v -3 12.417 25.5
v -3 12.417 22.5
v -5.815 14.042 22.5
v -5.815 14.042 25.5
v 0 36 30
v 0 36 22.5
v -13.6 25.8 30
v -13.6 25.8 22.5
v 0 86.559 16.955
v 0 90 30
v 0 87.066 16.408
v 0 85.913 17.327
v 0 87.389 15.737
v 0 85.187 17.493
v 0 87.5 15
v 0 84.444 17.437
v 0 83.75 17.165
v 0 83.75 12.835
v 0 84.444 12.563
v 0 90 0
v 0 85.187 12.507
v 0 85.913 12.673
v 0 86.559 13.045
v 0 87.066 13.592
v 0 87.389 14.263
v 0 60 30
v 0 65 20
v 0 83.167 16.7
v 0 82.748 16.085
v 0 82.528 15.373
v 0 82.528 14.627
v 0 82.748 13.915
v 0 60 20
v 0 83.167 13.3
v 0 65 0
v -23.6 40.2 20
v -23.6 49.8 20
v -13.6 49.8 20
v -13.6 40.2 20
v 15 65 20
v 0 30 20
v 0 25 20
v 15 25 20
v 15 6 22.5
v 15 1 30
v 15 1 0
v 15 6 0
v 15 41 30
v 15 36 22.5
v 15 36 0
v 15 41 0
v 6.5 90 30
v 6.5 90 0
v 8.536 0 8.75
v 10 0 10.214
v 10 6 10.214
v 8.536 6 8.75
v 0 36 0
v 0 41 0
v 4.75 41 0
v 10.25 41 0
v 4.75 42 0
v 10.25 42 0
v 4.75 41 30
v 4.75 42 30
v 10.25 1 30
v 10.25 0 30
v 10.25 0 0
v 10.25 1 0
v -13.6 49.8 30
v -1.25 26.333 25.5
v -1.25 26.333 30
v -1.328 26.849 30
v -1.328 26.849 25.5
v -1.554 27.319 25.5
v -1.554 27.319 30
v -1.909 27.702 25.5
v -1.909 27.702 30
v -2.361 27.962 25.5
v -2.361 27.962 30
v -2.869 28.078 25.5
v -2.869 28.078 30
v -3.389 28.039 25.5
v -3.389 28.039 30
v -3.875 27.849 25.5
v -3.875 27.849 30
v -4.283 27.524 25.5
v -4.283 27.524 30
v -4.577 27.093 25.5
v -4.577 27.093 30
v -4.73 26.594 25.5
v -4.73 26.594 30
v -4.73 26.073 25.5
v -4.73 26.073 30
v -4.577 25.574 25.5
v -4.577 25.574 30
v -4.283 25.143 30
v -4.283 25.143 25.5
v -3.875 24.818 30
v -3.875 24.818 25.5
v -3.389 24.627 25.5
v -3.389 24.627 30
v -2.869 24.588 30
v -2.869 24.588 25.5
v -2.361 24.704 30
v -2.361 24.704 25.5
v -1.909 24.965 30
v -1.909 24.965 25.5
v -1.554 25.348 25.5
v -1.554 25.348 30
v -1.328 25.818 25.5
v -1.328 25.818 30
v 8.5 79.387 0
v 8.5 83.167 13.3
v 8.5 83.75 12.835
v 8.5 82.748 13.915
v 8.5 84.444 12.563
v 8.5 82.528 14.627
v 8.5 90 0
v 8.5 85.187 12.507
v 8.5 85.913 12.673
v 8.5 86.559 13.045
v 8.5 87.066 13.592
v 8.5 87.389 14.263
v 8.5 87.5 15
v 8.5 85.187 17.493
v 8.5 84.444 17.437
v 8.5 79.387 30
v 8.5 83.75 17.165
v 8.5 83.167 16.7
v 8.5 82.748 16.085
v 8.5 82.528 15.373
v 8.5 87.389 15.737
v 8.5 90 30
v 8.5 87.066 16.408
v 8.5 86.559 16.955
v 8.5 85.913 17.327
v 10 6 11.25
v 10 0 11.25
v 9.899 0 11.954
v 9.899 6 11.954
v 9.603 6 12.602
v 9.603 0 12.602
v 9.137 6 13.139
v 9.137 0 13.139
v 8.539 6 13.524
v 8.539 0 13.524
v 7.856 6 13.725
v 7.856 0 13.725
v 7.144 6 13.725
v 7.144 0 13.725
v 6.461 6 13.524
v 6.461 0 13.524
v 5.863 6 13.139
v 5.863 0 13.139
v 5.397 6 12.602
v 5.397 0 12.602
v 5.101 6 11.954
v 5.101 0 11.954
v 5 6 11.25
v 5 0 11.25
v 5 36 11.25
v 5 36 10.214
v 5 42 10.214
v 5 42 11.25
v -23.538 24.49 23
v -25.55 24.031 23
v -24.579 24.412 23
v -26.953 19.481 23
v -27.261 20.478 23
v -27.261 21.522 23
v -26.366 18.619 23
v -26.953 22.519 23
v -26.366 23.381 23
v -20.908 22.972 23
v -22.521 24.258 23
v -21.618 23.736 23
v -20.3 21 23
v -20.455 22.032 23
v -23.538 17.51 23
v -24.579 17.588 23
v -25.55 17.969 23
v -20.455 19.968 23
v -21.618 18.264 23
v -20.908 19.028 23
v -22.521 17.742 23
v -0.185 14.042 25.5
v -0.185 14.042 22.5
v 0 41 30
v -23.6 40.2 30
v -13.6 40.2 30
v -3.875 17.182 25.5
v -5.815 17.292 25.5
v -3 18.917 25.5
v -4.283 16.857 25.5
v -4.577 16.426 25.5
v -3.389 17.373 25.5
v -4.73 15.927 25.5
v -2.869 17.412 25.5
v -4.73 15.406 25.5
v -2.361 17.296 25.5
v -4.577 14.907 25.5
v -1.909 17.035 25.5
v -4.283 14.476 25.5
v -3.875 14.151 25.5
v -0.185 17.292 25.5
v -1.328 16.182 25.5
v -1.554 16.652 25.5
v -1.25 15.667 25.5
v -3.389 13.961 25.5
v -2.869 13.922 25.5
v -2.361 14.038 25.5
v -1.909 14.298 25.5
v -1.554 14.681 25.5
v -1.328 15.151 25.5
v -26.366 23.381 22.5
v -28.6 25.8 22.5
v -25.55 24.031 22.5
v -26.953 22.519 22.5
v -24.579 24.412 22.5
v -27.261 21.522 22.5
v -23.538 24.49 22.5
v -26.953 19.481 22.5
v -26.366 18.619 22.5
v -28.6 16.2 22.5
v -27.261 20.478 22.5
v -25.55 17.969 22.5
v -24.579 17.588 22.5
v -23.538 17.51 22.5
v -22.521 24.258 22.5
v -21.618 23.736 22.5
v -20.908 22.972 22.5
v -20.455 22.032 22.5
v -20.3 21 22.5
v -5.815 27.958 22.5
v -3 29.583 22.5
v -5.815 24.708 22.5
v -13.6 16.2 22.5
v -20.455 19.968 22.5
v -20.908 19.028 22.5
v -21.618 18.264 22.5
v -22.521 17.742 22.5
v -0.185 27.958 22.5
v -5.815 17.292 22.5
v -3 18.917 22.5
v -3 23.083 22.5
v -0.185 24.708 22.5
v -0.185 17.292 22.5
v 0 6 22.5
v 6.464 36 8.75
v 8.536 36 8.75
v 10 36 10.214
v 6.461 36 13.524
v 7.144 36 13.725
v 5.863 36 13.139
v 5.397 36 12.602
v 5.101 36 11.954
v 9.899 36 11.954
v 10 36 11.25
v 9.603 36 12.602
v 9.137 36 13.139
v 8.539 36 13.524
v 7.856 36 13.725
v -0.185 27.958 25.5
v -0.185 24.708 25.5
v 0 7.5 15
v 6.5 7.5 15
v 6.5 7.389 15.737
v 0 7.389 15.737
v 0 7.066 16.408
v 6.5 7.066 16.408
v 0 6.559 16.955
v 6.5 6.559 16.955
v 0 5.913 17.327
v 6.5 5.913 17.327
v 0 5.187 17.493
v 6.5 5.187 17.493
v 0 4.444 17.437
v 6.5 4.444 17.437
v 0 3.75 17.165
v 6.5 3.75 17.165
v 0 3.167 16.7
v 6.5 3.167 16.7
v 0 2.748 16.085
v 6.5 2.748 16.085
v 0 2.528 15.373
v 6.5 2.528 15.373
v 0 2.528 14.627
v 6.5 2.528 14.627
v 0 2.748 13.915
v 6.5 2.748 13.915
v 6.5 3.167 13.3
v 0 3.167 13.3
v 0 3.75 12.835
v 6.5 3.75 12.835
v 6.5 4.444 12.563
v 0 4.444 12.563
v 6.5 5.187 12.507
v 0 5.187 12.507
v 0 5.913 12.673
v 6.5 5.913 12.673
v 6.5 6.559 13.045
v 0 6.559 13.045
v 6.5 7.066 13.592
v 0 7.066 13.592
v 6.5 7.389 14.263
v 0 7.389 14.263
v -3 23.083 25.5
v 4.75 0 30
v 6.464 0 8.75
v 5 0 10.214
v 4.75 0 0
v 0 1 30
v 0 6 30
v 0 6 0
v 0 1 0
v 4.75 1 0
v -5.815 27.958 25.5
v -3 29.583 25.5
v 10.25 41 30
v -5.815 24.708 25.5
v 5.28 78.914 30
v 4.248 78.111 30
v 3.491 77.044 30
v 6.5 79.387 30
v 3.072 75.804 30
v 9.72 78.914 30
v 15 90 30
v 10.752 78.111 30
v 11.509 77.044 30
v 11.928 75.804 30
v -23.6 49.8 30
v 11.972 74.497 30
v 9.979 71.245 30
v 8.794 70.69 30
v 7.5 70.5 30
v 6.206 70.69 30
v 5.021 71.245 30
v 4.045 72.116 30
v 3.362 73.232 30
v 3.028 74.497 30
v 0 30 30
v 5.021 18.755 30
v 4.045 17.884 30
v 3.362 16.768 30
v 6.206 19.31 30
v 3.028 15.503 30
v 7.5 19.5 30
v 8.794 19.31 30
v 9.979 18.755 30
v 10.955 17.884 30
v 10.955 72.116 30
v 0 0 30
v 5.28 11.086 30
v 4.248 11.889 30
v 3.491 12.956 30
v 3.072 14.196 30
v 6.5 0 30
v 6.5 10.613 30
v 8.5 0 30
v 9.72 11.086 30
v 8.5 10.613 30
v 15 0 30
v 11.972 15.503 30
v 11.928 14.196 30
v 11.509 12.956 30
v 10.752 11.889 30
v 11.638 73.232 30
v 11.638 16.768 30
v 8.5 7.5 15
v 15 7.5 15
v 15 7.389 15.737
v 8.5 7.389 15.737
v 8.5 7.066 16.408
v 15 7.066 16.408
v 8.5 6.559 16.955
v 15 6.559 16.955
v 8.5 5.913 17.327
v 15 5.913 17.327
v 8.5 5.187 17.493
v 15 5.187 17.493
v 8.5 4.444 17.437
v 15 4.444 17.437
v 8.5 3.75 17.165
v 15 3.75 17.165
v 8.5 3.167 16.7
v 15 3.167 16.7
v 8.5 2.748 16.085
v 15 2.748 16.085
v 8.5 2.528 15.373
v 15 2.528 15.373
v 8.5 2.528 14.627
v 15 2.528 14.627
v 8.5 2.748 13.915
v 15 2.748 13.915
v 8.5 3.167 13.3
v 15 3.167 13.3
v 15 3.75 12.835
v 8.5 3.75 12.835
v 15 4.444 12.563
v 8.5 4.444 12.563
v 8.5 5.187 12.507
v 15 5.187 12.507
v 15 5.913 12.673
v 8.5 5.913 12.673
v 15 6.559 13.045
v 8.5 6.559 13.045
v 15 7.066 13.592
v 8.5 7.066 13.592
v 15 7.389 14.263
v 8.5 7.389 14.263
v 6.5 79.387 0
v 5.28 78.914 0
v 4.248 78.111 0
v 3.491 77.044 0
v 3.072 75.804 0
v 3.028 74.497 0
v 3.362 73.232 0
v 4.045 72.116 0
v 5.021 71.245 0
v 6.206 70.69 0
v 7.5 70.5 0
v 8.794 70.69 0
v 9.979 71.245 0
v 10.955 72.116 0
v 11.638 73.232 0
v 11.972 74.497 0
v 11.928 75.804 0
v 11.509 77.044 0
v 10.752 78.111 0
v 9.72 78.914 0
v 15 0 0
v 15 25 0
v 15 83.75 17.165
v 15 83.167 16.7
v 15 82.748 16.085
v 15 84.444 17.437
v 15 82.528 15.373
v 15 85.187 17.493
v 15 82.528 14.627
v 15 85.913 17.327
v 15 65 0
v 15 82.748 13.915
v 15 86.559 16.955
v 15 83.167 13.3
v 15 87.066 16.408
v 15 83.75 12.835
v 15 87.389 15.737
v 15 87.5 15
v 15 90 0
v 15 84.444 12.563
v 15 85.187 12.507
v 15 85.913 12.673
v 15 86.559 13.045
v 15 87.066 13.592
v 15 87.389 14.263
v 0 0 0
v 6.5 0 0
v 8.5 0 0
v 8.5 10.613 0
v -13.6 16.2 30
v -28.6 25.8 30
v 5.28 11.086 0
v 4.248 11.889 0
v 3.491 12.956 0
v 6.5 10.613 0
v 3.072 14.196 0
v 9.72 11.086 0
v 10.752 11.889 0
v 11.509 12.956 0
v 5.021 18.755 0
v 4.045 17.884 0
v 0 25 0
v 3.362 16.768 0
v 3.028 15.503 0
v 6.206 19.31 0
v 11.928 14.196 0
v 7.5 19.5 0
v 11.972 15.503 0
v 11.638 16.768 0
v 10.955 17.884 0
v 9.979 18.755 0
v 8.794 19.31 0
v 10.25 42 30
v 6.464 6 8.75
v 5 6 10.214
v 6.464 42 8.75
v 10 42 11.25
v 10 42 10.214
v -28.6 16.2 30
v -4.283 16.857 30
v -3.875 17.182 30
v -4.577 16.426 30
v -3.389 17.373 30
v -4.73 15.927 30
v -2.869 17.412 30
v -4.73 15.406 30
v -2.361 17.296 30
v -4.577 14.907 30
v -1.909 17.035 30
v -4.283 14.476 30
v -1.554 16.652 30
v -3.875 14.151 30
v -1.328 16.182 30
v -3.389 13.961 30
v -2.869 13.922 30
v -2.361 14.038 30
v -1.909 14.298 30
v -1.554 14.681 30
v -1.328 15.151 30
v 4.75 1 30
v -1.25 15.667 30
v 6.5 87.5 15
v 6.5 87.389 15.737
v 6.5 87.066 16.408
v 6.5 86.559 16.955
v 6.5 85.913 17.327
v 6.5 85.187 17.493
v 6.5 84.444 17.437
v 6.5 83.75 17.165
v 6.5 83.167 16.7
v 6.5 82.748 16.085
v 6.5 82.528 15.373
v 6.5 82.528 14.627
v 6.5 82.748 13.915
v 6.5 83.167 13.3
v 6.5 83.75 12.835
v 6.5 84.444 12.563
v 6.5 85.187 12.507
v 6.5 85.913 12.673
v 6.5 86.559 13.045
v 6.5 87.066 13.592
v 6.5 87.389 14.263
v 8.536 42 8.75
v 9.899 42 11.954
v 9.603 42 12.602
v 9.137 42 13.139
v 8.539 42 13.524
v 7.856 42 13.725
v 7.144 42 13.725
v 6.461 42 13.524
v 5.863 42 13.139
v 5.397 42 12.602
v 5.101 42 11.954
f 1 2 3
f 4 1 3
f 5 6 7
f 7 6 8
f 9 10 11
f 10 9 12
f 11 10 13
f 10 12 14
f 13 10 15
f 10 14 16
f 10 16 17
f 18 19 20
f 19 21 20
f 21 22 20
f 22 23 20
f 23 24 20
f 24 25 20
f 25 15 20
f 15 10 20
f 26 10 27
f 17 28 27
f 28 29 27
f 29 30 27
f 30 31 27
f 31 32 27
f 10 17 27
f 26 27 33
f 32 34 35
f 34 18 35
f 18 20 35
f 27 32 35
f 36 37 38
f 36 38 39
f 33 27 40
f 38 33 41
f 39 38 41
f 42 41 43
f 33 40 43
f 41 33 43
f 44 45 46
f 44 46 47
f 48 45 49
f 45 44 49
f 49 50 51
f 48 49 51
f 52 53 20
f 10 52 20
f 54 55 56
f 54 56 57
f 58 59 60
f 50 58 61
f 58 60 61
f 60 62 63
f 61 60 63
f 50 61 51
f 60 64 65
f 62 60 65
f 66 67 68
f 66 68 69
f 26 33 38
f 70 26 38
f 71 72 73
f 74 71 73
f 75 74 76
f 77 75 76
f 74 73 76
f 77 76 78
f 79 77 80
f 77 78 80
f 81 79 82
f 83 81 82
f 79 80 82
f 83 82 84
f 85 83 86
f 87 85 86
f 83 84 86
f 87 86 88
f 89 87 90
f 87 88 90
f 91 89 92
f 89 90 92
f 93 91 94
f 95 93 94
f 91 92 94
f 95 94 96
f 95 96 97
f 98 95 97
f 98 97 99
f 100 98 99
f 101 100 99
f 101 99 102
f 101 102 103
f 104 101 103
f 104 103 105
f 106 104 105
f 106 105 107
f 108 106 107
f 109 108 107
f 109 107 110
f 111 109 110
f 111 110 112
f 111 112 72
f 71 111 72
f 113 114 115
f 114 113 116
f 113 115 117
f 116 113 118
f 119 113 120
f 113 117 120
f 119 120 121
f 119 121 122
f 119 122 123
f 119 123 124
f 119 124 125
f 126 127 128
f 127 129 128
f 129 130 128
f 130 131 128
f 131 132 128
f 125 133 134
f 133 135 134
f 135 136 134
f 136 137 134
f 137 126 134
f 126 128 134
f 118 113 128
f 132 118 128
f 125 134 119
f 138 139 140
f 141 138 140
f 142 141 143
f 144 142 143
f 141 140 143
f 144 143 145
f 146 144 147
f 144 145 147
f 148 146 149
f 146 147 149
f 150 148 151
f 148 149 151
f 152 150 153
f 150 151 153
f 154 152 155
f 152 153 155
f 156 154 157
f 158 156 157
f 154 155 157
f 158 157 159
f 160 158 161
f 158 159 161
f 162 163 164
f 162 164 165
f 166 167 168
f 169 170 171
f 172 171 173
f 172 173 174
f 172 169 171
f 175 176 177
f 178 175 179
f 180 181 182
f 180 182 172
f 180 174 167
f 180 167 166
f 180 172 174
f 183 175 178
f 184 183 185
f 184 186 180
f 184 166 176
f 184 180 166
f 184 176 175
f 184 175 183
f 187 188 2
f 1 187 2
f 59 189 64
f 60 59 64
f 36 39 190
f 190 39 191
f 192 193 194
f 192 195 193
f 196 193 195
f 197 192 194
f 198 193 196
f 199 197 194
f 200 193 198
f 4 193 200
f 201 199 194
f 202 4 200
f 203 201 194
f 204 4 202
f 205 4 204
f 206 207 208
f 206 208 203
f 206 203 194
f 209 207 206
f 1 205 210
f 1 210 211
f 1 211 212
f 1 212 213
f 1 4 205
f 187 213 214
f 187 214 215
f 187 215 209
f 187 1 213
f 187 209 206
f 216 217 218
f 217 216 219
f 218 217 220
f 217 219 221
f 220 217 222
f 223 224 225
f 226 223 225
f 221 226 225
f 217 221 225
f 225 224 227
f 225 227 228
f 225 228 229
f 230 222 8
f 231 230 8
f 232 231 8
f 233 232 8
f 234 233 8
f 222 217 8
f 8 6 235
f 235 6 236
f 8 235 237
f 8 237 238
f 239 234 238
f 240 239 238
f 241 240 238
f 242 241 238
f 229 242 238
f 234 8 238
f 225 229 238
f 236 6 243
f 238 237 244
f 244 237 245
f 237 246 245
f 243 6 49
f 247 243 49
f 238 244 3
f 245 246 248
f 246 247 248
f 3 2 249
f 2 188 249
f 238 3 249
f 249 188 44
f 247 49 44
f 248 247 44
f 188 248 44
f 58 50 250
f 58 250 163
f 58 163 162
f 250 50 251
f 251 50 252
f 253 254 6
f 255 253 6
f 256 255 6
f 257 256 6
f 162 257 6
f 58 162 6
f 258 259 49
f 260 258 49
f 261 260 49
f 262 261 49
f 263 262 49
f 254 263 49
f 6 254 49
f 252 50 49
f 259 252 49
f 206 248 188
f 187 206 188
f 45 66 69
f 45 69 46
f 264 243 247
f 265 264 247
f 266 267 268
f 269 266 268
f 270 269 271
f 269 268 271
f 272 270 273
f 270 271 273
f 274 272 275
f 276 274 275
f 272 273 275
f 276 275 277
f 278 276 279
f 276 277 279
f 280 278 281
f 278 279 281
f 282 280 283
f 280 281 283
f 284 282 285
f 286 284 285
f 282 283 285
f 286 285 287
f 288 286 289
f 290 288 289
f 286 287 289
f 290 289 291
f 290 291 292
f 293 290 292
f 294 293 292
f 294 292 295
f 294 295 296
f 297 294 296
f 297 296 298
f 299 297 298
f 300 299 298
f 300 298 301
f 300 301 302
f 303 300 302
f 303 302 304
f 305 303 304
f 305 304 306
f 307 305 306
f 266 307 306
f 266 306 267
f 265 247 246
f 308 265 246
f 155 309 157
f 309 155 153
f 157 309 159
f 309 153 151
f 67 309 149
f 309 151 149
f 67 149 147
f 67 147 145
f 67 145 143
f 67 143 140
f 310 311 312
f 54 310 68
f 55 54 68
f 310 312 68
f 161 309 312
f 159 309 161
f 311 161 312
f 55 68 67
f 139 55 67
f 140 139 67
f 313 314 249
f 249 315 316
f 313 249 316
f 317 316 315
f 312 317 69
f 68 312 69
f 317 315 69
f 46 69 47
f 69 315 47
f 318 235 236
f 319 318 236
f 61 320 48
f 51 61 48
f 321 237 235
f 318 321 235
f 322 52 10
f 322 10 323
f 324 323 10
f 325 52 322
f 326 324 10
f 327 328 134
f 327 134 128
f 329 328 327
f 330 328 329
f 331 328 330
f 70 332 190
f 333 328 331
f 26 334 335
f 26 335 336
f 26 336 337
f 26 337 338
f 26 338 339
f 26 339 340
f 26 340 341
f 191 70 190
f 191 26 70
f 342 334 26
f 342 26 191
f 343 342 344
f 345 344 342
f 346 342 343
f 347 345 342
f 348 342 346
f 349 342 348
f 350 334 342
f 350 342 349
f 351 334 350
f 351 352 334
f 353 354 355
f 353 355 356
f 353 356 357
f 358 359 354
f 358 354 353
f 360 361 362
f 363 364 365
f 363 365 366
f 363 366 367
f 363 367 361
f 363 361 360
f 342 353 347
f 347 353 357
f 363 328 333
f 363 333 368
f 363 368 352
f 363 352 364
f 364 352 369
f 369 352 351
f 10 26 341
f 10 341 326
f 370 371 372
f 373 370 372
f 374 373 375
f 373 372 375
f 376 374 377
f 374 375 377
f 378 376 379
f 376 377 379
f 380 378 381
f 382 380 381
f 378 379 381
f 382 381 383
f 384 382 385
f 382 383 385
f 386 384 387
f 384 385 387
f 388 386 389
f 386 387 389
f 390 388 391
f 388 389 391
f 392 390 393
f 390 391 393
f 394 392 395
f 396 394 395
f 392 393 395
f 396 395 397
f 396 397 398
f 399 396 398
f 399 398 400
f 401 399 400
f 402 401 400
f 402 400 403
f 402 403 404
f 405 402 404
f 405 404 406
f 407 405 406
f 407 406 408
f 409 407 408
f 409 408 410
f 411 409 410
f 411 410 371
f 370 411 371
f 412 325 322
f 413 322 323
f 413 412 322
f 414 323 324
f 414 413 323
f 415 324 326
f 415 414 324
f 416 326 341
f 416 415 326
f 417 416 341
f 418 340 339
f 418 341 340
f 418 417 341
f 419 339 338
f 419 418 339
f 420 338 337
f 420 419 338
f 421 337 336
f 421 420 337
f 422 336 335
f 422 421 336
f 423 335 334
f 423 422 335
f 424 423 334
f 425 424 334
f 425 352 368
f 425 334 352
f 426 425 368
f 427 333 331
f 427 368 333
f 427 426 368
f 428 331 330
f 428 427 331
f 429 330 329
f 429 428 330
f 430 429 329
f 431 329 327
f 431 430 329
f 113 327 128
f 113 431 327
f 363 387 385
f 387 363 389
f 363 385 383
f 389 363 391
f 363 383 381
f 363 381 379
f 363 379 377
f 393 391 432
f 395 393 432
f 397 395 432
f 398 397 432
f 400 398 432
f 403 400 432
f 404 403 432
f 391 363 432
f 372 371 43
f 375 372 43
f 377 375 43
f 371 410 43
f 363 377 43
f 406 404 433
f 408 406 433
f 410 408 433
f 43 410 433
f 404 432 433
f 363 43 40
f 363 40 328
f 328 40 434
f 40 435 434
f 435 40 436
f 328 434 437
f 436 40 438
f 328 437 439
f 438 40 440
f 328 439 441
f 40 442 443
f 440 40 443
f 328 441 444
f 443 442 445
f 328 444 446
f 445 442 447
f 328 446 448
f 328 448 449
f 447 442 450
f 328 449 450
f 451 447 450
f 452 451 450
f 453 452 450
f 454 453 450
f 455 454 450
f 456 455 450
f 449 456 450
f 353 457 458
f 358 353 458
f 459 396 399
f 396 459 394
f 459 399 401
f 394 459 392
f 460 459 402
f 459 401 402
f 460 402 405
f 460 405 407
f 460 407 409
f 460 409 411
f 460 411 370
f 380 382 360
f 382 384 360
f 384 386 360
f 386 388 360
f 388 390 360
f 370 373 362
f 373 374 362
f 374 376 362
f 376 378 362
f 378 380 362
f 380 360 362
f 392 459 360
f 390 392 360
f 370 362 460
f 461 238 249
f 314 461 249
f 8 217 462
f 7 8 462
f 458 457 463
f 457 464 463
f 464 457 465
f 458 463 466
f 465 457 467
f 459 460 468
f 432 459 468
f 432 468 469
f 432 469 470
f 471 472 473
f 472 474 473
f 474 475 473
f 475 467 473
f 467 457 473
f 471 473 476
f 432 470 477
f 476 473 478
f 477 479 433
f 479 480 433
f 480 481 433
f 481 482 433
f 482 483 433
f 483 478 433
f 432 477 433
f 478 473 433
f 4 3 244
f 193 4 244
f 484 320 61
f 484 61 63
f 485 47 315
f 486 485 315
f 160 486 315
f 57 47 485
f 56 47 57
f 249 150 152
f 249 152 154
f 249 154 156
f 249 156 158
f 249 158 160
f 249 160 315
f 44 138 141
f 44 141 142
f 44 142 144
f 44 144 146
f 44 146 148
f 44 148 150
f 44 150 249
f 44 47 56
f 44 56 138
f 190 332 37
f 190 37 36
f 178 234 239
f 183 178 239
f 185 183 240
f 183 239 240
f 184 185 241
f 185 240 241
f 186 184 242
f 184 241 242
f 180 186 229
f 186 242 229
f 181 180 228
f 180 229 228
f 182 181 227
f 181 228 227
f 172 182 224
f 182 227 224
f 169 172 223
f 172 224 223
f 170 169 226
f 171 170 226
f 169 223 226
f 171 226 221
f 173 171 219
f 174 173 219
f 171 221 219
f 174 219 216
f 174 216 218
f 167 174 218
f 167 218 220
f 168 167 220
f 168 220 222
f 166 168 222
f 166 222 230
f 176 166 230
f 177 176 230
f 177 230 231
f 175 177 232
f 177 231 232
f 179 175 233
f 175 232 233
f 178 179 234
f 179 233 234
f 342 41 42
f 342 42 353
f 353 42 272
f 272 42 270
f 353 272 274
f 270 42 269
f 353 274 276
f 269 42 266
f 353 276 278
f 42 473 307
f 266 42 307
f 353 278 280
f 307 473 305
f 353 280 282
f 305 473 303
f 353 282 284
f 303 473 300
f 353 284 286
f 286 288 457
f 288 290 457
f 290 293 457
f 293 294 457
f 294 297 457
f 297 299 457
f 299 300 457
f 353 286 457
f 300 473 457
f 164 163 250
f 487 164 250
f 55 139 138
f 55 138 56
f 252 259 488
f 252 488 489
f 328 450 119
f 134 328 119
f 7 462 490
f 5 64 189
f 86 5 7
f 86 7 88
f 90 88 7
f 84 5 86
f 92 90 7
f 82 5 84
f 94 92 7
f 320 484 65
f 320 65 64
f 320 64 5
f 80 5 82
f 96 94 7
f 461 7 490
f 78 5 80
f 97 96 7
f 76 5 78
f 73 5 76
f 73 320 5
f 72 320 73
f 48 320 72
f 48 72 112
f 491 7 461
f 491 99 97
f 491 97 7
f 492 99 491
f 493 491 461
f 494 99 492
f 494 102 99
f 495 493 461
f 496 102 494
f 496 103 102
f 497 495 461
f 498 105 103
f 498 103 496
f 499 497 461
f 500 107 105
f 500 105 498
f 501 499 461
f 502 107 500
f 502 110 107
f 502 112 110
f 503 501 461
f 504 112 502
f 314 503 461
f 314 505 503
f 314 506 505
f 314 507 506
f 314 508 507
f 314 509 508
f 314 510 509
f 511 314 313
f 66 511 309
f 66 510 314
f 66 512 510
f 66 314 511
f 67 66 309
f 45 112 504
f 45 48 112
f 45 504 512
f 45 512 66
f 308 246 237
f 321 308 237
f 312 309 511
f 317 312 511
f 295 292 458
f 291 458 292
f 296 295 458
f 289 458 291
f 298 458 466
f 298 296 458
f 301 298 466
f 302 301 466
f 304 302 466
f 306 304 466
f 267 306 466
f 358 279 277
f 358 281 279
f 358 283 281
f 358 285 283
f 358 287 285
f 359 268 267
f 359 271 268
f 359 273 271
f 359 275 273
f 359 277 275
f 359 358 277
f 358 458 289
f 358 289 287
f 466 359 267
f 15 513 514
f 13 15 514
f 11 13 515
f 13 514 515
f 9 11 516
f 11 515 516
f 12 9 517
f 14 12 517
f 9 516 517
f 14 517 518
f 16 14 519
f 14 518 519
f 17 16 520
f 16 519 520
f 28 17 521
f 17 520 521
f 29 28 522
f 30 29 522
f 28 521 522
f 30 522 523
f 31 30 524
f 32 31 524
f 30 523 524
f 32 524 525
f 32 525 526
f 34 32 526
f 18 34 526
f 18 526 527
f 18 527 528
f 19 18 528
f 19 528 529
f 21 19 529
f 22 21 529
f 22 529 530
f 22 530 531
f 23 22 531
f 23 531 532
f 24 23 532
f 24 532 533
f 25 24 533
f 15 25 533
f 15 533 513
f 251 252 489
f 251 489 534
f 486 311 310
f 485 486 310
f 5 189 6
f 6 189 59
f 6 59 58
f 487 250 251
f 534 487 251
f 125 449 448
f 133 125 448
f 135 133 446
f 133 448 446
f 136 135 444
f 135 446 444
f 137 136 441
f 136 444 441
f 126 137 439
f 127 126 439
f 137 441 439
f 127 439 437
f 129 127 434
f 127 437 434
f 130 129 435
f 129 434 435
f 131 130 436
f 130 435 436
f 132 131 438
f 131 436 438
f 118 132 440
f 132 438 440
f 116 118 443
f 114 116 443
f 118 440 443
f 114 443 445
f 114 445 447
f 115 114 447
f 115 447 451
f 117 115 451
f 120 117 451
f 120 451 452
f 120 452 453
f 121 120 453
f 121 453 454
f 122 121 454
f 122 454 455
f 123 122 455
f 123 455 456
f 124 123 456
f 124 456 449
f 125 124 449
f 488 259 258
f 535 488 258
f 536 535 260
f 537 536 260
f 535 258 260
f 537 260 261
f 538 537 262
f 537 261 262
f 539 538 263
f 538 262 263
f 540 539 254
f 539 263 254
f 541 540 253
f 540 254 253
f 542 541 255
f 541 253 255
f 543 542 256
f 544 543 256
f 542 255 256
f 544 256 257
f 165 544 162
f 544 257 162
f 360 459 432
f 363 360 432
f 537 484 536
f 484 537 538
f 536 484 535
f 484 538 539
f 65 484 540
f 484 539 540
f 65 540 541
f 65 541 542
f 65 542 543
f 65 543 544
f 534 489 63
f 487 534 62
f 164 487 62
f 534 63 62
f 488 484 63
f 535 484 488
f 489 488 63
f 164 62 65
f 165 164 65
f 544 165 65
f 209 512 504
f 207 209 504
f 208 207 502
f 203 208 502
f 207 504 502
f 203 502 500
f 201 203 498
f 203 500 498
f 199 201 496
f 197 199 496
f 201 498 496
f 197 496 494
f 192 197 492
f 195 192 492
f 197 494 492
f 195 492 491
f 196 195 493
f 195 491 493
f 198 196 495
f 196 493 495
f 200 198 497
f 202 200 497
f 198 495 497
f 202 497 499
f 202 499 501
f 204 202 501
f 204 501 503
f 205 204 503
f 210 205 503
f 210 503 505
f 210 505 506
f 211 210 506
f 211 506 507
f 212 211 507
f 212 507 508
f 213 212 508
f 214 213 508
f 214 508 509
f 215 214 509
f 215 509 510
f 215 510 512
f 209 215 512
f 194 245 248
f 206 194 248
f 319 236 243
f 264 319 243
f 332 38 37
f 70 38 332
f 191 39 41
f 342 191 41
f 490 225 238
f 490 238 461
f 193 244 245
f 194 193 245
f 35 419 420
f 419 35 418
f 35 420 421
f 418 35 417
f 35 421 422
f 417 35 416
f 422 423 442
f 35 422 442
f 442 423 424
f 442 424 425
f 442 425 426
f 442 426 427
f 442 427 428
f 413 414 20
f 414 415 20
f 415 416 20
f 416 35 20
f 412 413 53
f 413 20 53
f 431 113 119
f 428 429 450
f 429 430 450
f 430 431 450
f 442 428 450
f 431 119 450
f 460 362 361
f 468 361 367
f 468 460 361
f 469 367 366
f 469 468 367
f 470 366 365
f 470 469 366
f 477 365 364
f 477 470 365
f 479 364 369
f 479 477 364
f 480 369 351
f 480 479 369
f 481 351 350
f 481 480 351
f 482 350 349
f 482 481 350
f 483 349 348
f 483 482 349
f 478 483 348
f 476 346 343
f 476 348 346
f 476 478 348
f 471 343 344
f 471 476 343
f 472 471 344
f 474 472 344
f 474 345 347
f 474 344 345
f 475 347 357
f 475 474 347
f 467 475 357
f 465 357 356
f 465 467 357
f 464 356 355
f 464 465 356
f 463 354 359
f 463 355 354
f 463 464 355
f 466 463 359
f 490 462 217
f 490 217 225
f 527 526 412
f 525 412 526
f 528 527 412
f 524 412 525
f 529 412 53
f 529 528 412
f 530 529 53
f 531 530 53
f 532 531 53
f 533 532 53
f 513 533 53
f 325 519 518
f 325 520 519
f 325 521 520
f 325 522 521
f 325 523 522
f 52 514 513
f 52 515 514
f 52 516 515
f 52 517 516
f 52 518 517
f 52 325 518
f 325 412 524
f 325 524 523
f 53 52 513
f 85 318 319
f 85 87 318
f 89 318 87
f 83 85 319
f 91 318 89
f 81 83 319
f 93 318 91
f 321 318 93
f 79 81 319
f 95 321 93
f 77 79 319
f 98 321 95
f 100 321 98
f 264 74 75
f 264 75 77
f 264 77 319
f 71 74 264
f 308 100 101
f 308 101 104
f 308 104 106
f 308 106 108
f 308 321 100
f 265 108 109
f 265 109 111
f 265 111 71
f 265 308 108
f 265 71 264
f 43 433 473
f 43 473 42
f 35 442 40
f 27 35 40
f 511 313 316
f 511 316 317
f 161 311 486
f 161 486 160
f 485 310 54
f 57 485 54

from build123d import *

# Parameters (mm, degrees)
SKETCH_R        = 4.5
PAD_DEPTH       = 30
SKETCH001_W     = 2
SKETCH001_H     = 15
POCKET_DEPTH    = 30
SKETCH002_R     = 2.5
SKETCH002_W     = 40
SKETCH002_H     = 20
POCKET001_DEPTH = 35
CHAMFER_SIZE    = 8
SKETCH003_W     = 9.6
SKETCH003_H     = 10
PAD001_DEPTH    = 10
PAD002_DEPTH    = 30
SKETCH005_W     = 4.75
SKETCH005_H     = 1
POCKET002_DEPTH = 30.001
SKETCH006_W     = 30
SKETCH006_H     = 22.5
POCKET003_DEPTH = 35.001
POCKET004_DEPTH = 42.001
POCKET005_DEPTH = 3
SKETCH009_R     = 1.75
POCKET006_DEPTH = 30.001
CHAMFER001_SIZE = 8
SKETCH010_W     = 9.6
SKETCH010_H     = 7.5
PAD003_DEPTH    = 15
SKETCH011_R     = 3.5
POCKET007_DEPTH = 0.5


with BuildPart() as buildplatformmountingp1_alt:
    # Sketch → Pad (new body)
    with BuildSketch(Plane.XY):
        Polygon((0, 0), (15, 0), (15, 90), (0, 90), (0, 60), (-20, 45), (0, 30), align=None)
        with Locations((7.5, 15)):
            Circle(SKETCH_R, mode=Mode.SUBTRACT)
        with Locations((7.5, 75)):
            Circle(SKETCH_R, mode=Mode.SUBTRACT)
    extrude(amount=PAD_DEPTH)

    # Sketch001 → Pocket (cut)
    with BuildSketch(Plane.XY.offset(30)):
        with Locations((7.5, 82.5)):
            Rectangle(SKETCH001_W, SKETCH001_H)
        with Locations((7.5, 7.5)):
            Rectangle(SKETCH001_W, SKETCH001_H)
    extrude(amount=-POCKET_DEPTH, mode=Mode.SUBTRACT)

    # Sketch002 → Pocket001 (cut)
    with BuildSketch(Plane.YZ.offset(15)):
        with Locations((5, 15)):
            Circle(SKETCH002_R)
        with Locations((85, 15)):
            Circle(SKETCH002_R)
        with Locations((45, 10)):
            Rectangle(SKETCH002_W, SKETCH002_H)
    extrude(amount=-POCKET001_DEPTH, mode=Mode.SUBTRACT)

    # Chamfer
    chamfer_edges = [buildplatformmountingp1_alt.edges().sort_by_distance(p)[0] for p in [
        (-20, 45, 25),
    ]]
    chamfer(chamfer_edges, length=CHAMFER_SIZE)

    # Sketch003 → Pad001 (new body)
    with BuildSketch(Plane(origin=(-13.6, 0, 0), x_dir=(0, -1, 0), z_dir=(-1, 0, 0))):
        with Locations((-45, 25)):
            Rectangle(SKETCH003_W, SKETCH003_H)
    extrude(amount=PAD001_DEPTH)


with BuildPart() as buildplatformmountingp1:
    # Sketch004 → Pad002 (new body)
    with BuildSketch(Plane.XY):
        Polygon((0, 0), (15, 0), (15, 42), (0, 42), (0, 36), (-20, 21), (0, 6), align=None)
    extrude(amount=PAD002_DEPTH)

    # Sketch005 → Pocket002 (cut, through all)
    with BuildSketch(Plane.XY.offset(30)):
        with Locations((2.375, 41.5)):
            Rectangle(SKETCH005_W, SKETCH005_H)
        with Locations((12.625, 41.5)):
            Rectangle(SKETCH005_W, SKETCH005_H)
        with Locations((2.375, 0.5)):
            Rectangle(SKETCH005_W, SKETCH005_H)
        with Locations((12.625, 0.5)):
            Rectangle(SKETCH005_W, SKETCH005_H)
    extrude(amount=-POCKET002_DEPTH, mode=Mode.SUBTRACT)

    # Sketch006 → Pocket003 (cut, through all)
    with BuildSketch(Plane.YZ.offset(15)):
        with Locations((21, 11.25)):
            Rectangle(SKETCH006_W, SKETCH006_H)
    extrude(amount=-POCKET003_DEPTH, mode=Mode.SUBTRACT)

    # Sketch007 → Pocket004 (cut, through all)
    with BuildSketch(Plane.XZ):
        with BuildLine():
            ThreePointArc((10, 11.25), (7.5, 13.75), (5, 11.25))
            Line((5, 10.214466), (5, 11.25))
            Line((5, 10.214466), (6.464466, 8.75))
            Line((6.464466, 8.75), (7.5, 8.75))
            Line((7.5, 8.75), (8.535534, 8.75))
            Line((10, 10.214466), (8.535534, 8.75))
            Line((10, 11.25), (10, 10.214466))
        make_face()
    extrude(amount=-POCKET004_DEPTH, mode=Mode.SUBTRACT)

    # Sketch008 → Pocket005 (cut)
    with BuildSketch(Plane(origin=(0, 0, 22.5), x_dir=(1, 0, 0), z_dir=(0, 0, -1))):
        Polygon((-3, -12.416667), (-5.814583, -14.041667), (-5.814583, -17.291667), (-3, -18.916667), (-0.185417, -17.291667), (-0.185417, -14.041667), align=None)
        Polygon((-3, -23.083333), (-5.814583, -24.708333), (-5.814583, -27.958333), (-3, -29.583333), (-0.185417, -27.958333), (-0.185417, -24.708333), align=None)
    extrude(amount=-POCKET005_DEPTH, mode=Mode.SUBTRACT)

    # Sketch009 → Pocket006 (cut, through all)
    with BuildSketch(Plane.XY.offset(30)):
        with Locations((-3, 26.333333)):
            Circle(SKETCH009_R)
        with Locations((-3, 15.666667)):
            Circle(SKETCH009_R)
    extrude(amount=-POCKET006_DEPTH, mode=Mode.SUBTRACT)

    # Chamfer001
    chamfer001_edges = [buildplatformmountingp1.edges().sort_by_distance(p)[0] for p in [
        (-20, 21, 26.25),
    ]]
    chamfer(chamfer001_edges, length=CHAMFER001_SIZE)

    # Sketch010 → Pad003 (new body)
    with BuildSketch(Plane(origin=(-13.6, 0, 0), x_dir=(0, -1, 0), z_dir=(-1, 0, 0))):
        with Locations((-21, 26.25)):
            Rectangle(SKETCH010_W, SKETCH010_H)
    extrude(amount=PAD003_DEPTH)

    # Sketch011 → Pocket007 (cut)
    with BuildSketch(Plane(origin=(0, 0, 22.5), x_dir=(1, 0, 0), z_dir=(0, 0, -1))):
        with Locations((-23.8, -21)):
            Circle(SKETCH011_R)
    extrude(amount=-POCKET007_DEPTH, mode=Mode.SUBTRACT)


solid = Compound([buildplatformmountingp1_alt.part, buildplatformmountingp1.part])
